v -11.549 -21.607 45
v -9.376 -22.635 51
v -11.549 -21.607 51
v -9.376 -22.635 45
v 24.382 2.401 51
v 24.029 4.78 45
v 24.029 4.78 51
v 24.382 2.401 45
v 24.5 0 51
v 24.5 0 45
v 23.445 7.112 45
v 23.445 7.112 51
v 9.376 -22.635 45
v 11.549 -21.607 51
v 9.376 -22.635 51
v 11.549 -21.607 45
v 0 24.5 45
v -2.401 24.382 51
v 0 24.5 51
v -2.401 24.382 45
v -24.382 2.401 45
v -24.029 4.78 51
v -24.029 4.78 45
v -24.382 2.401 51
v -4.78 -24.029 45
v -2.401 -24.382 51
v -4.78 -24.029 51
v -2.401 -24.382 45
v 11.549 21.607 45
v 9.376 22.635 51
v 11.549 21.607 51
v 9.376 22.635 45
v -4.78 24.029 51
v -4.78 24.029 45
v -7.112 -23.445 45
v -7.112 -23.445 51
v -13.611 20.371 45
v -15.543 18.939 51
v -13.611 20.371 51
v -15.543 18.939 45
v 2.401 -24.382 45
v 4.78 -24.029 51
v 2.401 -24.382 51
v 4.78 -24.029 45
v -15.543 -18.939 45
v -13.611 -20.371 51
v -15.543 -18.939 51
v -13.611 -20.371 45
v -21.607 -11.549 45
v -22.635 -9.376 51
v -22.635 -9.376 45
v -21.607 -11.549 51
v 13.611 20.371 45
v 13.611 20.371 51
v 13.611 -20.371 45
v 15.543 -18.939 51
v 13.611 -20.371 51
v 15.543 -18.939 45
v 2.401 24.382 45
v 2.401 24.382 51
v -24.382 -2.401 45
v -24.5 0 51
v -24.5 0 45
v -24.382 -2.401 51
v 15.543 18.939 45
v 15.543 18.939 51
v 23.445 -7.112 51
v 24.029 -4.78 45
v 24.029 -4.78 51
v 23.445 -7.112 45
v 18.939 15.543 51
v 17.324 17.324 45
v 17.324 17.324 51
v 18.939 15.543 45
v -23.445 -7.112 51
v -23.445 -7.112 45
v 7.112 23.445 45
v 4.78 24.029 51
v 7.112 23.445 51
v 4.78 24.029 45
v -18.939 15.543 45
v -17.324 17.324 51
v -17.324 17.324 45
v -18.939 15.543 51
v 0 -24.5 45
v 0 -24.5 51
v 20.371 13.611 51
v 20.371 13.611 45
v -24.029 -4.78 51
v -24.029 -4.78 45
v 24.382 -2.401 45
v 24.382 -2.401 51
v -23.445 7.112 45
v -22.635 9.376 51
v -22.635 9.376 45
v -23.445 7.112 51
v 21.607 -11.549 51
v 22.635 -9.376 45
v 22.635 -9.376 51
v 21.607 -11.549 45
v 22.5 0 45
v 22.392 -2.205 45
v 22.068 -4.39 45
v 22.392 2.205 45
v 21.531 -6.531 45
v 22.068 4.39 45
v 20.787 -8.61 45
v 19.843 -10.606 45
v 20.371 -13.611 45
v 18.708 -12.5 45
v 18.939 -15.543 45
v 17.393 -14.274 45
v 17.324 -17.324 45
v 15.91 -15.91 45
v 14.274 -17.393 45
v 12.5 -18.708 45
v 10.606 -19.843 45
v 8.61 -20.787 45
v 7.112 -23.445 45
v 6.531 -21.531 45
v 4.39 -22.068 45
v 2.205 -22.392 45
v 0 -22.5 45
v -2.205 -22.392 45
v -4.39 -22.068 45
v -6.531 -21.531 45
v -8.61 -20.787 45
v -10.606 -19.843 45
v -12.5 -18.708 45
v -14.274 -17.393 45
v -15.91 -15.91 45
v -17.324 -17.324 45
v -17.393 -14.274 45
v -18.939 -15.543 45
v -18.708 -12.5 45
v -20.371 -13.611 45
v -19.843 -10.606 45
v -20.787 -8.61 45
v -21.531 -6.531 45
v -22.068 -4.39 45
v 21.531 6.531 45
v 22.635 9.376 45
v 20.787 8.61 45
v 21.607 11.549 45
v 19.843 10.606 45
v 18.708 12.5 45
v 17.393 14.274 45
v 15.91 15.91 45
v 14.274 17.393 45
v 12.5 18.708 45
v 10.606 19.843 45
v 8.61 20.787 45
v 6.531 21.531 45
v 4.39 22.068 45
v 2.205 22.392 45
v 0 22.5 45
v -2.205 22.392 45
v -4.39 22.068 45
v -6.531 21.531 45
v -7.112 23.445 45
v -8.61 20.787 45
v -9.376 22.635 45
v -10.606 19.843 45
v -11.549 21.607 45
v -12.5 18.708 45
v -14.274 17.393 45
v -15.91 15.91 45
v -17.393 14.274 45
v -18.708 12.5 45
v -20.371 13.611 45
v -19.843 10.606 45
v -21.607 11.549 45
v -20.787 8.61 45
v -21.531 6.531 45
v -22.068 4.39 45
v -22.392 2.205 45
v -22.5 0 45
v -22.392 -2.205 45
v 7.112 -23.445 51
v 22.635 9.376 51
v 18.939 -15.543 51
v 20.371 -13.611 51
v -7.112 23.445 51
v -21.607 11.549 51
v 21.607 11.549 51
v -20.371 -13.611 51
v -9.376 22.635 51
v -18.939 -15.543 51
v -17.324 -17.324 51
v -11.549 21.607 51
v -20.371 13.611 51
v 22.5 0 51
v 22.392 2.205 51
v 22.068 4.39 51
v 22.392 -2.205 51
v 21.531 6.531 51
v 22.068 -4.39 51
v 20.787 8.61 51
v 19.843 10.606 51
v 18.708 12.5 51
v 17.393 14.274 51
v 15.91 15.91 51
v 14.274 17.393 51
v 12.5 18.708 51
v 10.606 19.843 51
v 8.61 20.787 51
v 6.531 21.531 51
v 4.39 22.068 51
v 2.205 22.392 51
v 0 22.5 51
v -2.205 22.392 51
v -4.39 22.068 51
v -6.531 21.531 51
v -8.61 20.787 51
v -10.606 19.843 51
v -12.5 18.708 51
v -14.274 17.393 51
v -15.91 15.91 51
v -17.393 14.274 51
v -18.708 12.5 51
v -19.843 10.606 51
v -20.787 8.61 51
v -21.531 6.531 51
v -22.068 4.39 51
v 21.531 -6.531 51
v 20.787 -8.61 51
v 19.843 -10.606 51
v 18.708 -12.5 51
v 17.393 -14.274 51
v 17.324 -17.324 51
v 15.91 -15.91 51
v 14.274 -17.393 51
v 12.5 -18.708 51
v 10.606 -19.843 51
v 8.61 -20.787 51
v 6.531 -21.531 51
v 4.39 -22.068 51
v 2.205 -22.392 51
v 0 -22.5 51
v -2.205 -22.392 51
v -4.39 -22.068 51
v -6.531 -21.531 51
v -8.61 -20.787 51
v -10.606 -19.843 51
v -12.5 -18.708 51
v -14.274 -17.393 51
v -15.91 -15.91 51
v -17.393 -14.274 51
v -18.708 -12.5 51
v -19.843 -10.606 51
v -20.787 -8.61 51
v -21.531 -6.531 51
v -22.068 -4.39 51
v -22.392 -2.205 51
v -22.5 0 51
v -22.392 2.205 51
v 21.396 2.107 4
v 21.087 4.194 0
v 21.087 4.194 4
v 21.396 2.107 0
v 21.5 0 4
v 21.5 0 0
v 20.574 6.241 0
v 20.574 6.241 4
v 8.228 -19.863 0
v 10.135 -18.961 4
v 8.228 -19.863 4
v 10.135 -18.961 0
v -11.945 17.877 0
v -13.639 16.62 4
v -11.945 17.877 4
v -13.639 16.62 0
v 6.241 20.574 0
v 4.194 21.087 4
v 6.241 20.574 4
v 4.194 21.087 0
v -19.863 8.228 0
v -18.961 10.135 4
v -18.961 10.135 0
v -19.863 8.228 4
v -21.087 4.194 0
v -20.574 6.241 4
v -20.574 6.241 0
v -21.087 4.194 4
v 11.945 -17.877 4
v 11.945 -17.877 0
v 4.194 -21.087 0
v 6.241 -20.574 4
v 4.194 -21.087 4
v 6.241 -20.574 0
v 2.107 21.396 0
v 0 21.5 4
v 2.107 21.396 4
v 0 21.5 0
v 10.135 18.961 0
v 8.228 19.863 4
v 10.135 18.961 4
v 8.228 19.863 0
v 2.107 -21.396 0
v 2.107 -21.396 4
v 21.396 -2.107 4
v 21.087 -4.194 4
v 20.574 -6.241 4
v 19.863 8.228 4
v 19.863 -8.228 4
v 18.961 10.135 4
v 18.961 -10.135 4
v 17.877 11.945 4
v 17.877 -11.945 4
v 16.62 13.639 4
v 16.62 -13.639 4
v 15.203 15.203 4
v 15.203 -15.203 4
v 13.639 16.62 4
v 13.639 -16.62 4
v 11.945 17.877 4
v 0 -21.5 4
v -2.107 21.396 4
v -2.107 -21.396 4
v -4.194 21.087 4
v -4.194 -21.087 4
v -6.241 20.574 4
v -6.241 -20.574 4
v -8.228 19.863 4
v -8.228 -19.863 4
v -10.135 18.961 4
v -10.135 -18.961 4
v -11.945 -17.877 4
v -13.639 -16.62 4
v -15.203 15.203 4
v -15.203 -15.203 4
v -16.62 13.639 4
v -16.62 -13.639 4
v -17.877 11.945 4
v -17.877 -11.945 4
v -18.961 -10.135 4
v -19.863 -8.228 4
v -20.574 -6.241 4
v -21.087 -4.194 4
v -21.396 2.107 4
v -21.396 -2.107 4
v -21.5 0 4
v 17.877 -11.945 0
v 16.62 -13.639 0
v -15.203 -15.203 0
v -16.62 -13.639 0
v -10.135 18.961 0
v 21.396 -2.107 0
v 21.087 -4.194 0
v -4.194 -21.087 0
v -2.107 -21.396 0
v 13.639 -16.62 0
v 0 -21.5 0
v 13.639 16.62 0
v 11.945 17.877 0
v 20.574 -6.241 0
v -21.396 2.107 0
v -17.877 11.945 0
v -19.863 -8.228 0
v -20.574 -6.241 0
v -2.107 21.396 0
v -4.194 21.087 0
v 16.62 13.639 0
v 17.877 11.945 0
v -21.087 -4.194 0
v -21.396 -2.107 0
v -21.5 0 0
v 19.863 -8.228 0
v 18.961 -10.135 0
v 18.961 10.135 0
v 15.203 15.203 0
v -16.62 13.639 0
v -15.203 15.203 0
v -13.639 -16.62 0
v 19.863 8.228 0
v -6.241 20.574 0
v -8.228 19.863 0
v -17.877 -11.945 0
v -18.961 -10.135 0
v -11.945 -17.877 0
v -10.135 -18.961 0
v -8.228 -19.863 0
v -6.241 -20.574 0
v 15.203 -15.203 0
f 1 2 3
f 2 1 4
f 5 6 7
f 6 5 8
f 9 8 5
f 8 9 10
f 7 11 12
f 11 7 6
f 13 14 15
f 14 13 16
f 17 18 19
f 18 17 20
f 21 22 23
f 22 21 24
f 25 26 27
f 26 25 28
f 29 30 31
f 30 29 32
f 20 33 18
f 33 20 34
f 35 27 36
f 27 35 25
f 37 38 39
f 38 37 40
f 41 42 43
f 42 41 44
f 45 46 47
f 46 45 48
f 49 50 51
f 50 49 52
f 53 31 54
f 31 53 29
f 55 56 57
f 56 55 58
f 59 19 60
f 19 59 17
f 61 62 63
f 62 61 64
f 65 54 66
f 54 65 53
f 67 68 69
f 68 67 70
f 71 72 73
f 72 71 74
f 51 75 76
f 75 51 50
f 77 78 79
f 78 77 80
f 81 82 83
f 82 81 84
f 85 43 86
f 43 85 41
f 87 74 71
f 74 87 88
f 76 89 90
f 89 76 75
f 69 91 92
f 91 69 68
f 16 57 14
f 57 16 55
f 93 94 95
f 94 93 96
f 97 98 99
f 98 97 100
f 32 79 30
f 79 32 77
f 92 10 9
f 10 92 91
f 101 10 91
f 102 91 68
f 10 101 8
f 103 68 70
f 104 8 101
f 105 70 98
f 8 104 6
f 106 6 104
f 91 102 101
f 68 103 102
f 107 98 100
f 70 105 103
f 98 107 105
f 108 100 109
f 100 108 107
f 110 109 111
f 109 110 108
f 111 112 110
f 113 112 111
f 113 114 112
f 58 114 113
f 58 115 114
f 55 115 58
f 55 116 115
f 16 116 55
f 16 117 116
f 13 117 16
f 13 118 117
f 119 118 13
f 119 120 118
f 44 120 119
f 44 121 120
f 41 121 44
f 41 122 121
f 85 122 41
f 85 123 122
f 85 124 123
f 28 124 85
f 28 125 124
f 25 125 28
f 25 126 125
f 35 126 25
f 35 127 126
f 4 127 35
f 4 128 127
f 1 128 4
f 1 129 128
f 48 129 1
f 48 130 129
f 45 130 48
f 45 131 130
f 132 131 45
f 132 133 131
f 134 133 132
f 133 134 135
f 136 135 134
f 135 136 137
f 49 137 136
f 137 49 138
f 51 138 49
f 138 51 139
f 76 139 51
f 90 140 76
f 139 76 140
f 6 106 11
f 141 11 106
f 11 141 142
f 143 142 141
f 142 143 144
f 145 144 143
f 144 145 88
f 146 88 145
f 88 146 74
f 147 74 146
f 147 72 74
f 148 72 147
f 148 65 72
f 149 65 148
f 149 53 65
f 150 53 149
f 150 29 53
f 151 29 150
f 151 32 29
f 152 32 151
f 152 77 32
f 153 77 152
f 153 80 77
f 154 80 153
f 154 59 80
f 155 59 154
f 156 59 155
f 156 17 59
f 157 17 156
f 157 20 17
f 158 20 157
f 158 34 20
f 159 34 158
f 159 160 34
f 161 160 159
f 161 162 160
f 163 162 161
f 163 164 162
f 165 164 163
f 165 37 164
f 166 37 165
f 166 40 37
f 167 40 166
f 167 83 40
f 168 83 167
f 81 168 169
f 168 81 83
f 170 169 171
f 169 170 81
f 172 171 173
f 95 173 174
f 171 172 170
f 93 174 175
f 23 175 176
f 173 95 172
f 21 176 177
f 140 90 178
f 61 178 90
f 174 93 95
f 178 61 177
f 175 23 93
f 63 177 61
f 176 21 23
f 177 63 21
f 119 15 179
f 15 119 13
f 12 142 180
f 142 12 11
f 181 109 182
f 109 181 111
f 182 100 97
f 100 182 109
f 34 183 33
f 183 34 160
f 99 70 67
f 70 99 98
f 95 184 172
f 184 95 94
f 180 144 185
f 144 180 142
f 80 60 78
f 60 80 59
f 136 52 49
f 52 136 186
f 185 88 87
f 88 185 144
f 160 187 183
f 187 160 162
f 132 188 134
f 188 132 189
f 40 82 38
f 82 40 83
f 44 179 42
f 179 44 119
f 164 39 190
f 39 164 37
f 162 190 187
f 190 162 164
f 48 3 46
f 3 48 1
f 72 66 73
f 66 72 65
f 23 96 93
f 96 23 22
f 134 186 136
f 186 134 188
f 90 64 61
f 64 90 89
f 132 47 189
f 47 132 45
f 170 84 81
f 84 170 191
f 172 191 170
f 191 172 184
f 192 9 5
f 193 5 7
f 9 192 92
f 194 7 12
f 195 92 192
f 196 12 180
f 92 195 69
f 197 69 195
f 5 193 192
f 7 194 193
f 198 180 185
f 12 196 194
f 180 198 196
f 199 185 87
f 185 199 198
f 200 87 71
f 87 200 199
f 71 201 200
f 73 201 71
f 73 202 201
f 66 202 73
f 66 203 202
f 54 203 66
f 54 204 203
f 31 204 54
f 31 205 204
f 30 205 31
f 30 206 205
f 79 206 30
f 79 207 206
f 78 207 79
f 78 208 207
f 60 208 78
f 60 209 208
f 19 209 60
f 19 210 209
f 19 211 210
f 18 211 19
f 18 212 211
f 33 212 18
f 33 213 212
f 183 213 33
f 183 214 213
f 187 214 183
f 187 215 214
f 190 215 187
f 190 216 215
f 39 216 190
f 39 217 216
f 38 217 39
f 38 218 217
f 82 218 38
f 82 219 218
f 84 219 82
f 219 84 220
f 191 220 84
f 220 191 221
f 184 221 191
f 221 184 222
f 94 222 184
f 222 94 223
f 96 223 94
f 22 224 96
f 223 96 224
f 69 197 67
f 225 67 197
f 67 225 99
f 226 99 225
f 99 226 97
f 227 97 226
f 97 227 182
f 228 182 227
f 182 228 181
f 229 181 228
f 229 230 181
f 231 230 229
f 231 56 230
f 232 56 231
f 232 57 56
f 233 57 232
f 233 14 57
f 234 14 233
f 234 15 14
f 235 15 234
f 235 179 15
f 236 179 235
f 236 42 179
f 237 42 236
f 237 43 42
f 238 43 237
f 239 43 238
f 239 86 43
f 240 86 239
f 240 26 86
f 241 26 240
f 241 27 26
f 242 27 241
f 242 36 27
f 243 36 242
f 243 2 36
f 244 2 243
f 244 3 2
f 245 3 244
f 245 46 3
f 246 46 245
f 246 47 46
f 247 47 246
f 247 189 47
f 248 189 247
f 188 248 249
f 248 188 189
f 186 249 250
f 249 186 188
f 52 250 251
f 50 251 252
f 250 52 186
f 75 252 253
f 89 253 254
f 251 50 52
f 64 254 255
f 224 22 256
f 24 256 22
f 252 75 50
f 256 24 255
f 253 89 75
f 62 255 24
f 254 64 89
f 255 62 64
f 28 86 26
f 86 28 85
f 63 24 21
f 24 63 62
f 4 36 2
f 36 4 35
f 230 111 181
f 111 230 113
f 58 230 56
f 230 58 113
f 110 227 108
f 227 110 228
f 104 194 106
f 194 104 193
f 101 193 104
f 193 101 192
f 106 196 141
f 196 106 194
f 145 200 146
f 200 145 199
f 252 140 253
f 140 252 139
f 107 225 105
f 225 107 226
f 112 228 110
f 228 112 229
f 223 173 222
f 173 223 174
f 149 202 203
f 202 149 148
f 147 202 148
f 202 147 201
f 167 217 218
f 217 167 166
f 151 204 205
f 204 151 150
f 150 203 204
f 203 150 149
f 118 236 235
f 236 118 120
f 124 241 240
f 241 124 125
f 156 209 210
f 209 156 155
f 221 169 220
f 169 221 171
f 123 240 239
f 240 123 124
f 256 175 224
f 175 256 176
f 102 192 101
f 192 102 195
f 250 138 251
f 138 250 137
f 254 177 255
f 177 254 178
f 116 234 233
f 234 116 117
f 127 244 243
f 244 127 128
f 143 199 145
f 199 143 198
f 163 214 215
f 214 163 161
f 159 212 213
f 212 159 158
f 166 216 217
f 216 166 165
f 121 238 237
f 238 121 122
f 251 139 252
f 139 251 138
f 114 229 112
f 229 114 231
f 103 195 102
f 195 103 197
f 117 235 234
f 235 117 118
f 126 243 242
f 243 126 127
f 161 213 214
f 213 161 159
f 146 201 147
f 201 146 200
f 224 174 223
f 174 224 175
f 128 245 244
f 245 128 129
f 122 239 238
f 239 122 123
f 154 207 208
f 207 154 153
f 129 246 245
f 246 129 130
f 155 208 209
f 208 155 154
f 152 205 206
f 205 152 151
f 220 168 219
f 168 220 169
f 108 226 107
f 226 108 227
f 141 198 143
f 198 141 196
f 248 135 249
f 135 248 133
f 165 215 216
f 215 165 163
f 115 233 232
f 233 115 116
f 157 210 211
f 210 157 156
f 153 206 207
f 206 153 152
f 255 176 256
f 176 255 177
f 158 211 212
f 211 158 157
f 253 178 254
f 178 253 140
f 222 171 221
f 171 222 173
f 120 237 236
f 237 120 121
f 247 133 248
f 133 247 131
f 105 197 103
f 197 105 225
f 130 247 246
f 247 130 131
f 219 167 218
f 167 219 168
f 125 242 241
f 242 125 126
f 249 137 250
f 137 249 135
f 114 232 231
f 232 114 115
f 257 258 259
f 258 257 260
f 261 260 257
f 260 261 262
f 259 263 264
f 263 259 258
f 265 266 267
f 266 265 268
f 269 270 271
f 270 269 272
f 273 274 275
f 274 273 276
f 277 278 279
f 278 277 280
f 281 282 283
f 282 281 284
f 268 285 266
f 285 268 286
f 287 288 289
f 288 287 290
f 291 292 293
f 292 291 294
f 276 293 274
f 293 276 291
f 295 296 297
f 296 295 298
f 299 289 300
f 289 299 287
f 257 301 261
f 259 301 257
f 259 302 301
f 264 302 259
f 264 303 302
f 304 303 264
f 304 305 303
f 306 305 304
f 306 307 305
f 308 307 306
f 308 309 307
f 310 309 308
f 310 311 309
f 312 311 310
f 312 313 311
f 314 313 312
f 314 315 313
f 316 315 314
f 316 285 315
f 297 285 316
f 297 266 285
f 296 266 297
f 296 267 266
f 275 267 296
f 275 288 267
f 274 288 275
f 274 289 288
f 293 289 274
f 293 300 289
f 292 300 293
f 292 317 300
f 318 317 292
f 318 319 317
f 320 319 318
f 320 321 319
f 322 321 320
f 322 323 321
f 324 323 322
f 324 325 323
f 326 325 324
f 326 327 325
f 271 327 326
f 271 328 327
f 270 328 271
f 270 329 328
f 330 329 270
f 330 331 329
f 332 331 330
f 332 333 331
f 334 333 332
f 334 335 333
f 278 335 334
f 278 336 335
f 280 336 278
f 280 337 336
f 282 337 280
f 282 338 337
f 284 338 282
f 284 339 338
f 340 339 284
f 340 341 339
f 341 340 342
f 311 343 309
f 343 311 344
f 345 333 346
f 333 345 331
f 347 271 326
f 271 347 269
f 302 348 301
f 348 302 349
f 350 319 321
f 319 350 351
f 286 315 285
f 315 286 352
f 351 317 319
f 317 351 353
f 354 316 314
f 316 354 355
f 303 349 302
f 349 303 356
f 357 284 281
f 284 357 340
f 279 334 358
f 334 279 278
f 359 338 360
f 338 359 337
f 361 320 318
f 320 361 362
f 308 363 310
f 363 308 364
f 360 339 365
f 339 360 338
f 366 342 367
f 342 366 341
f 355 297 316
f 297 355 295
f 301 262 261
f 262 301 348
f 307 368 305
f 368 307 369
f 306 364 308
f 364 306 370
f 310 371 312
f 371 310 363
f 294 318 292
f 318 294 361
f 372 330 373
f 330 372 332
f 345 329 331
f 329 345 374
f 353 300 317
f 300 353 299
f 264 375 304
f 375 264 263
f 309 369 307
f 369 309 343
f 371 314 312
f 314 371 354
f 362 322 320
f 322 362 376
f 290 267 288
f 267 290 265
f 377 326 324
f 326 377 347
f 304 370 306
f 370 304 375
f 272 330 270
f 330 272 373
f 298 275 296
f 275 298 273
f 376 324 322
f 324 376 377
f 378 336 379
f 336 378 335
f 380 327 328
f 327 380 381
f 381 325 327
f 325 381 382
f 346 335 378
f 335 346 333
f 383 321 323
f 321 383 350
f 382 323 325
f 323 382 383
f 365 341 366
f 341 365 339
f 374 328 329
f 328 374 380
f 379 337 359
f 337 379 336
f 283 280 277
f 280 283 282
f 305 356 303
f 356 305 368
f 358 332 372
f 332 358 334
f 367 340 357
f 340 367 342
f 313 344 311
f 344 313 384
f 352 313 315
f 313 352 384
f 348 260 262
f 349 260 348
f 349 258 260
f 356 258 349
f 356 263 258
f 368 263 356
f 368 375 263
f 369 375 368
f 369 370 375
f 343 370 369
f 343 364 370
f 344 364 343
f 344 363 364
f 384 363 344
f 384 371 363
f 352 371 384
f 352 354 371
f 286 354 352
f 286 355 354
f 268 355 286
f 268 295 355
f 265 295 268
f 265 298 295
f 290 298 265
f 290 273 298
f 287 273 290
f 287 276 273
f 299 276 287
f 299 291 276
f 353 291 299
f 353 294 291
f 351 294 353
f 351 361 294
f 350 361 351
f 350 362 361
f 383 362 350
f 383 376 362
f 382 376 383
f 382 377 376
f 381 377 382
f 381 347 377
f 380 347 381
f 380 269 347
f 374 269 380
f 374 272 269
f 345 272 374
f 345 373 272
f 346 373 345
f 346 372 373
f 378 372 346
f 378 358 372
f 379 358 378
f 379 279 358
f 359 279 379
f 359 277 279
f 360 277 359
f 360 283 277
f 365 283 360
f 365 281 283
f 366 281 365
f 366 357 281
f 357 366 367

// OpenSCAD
// See https://www.thingiverse.com/thing:4020636/files for an original

$fn = $preview ? 24 : 64;
preview_fix = $preview ? .1 : 0;

module top_ring(dia=49, height=6, thickness=2) {
    difference() 
    {
        cylinder(d=dia, h=height);
        translate([0,0,-preview_fix]) {
            cylinder(d=dia-thickness*2, h=height+preview_fix*2);
        }
    }
}

module bottom_plate(dia=43,thickness=4, height=4) {
    cylinder(d=dia, h=height);
}

bottom_plate();
translate([0,0,45]) {
    top_ring();
}
